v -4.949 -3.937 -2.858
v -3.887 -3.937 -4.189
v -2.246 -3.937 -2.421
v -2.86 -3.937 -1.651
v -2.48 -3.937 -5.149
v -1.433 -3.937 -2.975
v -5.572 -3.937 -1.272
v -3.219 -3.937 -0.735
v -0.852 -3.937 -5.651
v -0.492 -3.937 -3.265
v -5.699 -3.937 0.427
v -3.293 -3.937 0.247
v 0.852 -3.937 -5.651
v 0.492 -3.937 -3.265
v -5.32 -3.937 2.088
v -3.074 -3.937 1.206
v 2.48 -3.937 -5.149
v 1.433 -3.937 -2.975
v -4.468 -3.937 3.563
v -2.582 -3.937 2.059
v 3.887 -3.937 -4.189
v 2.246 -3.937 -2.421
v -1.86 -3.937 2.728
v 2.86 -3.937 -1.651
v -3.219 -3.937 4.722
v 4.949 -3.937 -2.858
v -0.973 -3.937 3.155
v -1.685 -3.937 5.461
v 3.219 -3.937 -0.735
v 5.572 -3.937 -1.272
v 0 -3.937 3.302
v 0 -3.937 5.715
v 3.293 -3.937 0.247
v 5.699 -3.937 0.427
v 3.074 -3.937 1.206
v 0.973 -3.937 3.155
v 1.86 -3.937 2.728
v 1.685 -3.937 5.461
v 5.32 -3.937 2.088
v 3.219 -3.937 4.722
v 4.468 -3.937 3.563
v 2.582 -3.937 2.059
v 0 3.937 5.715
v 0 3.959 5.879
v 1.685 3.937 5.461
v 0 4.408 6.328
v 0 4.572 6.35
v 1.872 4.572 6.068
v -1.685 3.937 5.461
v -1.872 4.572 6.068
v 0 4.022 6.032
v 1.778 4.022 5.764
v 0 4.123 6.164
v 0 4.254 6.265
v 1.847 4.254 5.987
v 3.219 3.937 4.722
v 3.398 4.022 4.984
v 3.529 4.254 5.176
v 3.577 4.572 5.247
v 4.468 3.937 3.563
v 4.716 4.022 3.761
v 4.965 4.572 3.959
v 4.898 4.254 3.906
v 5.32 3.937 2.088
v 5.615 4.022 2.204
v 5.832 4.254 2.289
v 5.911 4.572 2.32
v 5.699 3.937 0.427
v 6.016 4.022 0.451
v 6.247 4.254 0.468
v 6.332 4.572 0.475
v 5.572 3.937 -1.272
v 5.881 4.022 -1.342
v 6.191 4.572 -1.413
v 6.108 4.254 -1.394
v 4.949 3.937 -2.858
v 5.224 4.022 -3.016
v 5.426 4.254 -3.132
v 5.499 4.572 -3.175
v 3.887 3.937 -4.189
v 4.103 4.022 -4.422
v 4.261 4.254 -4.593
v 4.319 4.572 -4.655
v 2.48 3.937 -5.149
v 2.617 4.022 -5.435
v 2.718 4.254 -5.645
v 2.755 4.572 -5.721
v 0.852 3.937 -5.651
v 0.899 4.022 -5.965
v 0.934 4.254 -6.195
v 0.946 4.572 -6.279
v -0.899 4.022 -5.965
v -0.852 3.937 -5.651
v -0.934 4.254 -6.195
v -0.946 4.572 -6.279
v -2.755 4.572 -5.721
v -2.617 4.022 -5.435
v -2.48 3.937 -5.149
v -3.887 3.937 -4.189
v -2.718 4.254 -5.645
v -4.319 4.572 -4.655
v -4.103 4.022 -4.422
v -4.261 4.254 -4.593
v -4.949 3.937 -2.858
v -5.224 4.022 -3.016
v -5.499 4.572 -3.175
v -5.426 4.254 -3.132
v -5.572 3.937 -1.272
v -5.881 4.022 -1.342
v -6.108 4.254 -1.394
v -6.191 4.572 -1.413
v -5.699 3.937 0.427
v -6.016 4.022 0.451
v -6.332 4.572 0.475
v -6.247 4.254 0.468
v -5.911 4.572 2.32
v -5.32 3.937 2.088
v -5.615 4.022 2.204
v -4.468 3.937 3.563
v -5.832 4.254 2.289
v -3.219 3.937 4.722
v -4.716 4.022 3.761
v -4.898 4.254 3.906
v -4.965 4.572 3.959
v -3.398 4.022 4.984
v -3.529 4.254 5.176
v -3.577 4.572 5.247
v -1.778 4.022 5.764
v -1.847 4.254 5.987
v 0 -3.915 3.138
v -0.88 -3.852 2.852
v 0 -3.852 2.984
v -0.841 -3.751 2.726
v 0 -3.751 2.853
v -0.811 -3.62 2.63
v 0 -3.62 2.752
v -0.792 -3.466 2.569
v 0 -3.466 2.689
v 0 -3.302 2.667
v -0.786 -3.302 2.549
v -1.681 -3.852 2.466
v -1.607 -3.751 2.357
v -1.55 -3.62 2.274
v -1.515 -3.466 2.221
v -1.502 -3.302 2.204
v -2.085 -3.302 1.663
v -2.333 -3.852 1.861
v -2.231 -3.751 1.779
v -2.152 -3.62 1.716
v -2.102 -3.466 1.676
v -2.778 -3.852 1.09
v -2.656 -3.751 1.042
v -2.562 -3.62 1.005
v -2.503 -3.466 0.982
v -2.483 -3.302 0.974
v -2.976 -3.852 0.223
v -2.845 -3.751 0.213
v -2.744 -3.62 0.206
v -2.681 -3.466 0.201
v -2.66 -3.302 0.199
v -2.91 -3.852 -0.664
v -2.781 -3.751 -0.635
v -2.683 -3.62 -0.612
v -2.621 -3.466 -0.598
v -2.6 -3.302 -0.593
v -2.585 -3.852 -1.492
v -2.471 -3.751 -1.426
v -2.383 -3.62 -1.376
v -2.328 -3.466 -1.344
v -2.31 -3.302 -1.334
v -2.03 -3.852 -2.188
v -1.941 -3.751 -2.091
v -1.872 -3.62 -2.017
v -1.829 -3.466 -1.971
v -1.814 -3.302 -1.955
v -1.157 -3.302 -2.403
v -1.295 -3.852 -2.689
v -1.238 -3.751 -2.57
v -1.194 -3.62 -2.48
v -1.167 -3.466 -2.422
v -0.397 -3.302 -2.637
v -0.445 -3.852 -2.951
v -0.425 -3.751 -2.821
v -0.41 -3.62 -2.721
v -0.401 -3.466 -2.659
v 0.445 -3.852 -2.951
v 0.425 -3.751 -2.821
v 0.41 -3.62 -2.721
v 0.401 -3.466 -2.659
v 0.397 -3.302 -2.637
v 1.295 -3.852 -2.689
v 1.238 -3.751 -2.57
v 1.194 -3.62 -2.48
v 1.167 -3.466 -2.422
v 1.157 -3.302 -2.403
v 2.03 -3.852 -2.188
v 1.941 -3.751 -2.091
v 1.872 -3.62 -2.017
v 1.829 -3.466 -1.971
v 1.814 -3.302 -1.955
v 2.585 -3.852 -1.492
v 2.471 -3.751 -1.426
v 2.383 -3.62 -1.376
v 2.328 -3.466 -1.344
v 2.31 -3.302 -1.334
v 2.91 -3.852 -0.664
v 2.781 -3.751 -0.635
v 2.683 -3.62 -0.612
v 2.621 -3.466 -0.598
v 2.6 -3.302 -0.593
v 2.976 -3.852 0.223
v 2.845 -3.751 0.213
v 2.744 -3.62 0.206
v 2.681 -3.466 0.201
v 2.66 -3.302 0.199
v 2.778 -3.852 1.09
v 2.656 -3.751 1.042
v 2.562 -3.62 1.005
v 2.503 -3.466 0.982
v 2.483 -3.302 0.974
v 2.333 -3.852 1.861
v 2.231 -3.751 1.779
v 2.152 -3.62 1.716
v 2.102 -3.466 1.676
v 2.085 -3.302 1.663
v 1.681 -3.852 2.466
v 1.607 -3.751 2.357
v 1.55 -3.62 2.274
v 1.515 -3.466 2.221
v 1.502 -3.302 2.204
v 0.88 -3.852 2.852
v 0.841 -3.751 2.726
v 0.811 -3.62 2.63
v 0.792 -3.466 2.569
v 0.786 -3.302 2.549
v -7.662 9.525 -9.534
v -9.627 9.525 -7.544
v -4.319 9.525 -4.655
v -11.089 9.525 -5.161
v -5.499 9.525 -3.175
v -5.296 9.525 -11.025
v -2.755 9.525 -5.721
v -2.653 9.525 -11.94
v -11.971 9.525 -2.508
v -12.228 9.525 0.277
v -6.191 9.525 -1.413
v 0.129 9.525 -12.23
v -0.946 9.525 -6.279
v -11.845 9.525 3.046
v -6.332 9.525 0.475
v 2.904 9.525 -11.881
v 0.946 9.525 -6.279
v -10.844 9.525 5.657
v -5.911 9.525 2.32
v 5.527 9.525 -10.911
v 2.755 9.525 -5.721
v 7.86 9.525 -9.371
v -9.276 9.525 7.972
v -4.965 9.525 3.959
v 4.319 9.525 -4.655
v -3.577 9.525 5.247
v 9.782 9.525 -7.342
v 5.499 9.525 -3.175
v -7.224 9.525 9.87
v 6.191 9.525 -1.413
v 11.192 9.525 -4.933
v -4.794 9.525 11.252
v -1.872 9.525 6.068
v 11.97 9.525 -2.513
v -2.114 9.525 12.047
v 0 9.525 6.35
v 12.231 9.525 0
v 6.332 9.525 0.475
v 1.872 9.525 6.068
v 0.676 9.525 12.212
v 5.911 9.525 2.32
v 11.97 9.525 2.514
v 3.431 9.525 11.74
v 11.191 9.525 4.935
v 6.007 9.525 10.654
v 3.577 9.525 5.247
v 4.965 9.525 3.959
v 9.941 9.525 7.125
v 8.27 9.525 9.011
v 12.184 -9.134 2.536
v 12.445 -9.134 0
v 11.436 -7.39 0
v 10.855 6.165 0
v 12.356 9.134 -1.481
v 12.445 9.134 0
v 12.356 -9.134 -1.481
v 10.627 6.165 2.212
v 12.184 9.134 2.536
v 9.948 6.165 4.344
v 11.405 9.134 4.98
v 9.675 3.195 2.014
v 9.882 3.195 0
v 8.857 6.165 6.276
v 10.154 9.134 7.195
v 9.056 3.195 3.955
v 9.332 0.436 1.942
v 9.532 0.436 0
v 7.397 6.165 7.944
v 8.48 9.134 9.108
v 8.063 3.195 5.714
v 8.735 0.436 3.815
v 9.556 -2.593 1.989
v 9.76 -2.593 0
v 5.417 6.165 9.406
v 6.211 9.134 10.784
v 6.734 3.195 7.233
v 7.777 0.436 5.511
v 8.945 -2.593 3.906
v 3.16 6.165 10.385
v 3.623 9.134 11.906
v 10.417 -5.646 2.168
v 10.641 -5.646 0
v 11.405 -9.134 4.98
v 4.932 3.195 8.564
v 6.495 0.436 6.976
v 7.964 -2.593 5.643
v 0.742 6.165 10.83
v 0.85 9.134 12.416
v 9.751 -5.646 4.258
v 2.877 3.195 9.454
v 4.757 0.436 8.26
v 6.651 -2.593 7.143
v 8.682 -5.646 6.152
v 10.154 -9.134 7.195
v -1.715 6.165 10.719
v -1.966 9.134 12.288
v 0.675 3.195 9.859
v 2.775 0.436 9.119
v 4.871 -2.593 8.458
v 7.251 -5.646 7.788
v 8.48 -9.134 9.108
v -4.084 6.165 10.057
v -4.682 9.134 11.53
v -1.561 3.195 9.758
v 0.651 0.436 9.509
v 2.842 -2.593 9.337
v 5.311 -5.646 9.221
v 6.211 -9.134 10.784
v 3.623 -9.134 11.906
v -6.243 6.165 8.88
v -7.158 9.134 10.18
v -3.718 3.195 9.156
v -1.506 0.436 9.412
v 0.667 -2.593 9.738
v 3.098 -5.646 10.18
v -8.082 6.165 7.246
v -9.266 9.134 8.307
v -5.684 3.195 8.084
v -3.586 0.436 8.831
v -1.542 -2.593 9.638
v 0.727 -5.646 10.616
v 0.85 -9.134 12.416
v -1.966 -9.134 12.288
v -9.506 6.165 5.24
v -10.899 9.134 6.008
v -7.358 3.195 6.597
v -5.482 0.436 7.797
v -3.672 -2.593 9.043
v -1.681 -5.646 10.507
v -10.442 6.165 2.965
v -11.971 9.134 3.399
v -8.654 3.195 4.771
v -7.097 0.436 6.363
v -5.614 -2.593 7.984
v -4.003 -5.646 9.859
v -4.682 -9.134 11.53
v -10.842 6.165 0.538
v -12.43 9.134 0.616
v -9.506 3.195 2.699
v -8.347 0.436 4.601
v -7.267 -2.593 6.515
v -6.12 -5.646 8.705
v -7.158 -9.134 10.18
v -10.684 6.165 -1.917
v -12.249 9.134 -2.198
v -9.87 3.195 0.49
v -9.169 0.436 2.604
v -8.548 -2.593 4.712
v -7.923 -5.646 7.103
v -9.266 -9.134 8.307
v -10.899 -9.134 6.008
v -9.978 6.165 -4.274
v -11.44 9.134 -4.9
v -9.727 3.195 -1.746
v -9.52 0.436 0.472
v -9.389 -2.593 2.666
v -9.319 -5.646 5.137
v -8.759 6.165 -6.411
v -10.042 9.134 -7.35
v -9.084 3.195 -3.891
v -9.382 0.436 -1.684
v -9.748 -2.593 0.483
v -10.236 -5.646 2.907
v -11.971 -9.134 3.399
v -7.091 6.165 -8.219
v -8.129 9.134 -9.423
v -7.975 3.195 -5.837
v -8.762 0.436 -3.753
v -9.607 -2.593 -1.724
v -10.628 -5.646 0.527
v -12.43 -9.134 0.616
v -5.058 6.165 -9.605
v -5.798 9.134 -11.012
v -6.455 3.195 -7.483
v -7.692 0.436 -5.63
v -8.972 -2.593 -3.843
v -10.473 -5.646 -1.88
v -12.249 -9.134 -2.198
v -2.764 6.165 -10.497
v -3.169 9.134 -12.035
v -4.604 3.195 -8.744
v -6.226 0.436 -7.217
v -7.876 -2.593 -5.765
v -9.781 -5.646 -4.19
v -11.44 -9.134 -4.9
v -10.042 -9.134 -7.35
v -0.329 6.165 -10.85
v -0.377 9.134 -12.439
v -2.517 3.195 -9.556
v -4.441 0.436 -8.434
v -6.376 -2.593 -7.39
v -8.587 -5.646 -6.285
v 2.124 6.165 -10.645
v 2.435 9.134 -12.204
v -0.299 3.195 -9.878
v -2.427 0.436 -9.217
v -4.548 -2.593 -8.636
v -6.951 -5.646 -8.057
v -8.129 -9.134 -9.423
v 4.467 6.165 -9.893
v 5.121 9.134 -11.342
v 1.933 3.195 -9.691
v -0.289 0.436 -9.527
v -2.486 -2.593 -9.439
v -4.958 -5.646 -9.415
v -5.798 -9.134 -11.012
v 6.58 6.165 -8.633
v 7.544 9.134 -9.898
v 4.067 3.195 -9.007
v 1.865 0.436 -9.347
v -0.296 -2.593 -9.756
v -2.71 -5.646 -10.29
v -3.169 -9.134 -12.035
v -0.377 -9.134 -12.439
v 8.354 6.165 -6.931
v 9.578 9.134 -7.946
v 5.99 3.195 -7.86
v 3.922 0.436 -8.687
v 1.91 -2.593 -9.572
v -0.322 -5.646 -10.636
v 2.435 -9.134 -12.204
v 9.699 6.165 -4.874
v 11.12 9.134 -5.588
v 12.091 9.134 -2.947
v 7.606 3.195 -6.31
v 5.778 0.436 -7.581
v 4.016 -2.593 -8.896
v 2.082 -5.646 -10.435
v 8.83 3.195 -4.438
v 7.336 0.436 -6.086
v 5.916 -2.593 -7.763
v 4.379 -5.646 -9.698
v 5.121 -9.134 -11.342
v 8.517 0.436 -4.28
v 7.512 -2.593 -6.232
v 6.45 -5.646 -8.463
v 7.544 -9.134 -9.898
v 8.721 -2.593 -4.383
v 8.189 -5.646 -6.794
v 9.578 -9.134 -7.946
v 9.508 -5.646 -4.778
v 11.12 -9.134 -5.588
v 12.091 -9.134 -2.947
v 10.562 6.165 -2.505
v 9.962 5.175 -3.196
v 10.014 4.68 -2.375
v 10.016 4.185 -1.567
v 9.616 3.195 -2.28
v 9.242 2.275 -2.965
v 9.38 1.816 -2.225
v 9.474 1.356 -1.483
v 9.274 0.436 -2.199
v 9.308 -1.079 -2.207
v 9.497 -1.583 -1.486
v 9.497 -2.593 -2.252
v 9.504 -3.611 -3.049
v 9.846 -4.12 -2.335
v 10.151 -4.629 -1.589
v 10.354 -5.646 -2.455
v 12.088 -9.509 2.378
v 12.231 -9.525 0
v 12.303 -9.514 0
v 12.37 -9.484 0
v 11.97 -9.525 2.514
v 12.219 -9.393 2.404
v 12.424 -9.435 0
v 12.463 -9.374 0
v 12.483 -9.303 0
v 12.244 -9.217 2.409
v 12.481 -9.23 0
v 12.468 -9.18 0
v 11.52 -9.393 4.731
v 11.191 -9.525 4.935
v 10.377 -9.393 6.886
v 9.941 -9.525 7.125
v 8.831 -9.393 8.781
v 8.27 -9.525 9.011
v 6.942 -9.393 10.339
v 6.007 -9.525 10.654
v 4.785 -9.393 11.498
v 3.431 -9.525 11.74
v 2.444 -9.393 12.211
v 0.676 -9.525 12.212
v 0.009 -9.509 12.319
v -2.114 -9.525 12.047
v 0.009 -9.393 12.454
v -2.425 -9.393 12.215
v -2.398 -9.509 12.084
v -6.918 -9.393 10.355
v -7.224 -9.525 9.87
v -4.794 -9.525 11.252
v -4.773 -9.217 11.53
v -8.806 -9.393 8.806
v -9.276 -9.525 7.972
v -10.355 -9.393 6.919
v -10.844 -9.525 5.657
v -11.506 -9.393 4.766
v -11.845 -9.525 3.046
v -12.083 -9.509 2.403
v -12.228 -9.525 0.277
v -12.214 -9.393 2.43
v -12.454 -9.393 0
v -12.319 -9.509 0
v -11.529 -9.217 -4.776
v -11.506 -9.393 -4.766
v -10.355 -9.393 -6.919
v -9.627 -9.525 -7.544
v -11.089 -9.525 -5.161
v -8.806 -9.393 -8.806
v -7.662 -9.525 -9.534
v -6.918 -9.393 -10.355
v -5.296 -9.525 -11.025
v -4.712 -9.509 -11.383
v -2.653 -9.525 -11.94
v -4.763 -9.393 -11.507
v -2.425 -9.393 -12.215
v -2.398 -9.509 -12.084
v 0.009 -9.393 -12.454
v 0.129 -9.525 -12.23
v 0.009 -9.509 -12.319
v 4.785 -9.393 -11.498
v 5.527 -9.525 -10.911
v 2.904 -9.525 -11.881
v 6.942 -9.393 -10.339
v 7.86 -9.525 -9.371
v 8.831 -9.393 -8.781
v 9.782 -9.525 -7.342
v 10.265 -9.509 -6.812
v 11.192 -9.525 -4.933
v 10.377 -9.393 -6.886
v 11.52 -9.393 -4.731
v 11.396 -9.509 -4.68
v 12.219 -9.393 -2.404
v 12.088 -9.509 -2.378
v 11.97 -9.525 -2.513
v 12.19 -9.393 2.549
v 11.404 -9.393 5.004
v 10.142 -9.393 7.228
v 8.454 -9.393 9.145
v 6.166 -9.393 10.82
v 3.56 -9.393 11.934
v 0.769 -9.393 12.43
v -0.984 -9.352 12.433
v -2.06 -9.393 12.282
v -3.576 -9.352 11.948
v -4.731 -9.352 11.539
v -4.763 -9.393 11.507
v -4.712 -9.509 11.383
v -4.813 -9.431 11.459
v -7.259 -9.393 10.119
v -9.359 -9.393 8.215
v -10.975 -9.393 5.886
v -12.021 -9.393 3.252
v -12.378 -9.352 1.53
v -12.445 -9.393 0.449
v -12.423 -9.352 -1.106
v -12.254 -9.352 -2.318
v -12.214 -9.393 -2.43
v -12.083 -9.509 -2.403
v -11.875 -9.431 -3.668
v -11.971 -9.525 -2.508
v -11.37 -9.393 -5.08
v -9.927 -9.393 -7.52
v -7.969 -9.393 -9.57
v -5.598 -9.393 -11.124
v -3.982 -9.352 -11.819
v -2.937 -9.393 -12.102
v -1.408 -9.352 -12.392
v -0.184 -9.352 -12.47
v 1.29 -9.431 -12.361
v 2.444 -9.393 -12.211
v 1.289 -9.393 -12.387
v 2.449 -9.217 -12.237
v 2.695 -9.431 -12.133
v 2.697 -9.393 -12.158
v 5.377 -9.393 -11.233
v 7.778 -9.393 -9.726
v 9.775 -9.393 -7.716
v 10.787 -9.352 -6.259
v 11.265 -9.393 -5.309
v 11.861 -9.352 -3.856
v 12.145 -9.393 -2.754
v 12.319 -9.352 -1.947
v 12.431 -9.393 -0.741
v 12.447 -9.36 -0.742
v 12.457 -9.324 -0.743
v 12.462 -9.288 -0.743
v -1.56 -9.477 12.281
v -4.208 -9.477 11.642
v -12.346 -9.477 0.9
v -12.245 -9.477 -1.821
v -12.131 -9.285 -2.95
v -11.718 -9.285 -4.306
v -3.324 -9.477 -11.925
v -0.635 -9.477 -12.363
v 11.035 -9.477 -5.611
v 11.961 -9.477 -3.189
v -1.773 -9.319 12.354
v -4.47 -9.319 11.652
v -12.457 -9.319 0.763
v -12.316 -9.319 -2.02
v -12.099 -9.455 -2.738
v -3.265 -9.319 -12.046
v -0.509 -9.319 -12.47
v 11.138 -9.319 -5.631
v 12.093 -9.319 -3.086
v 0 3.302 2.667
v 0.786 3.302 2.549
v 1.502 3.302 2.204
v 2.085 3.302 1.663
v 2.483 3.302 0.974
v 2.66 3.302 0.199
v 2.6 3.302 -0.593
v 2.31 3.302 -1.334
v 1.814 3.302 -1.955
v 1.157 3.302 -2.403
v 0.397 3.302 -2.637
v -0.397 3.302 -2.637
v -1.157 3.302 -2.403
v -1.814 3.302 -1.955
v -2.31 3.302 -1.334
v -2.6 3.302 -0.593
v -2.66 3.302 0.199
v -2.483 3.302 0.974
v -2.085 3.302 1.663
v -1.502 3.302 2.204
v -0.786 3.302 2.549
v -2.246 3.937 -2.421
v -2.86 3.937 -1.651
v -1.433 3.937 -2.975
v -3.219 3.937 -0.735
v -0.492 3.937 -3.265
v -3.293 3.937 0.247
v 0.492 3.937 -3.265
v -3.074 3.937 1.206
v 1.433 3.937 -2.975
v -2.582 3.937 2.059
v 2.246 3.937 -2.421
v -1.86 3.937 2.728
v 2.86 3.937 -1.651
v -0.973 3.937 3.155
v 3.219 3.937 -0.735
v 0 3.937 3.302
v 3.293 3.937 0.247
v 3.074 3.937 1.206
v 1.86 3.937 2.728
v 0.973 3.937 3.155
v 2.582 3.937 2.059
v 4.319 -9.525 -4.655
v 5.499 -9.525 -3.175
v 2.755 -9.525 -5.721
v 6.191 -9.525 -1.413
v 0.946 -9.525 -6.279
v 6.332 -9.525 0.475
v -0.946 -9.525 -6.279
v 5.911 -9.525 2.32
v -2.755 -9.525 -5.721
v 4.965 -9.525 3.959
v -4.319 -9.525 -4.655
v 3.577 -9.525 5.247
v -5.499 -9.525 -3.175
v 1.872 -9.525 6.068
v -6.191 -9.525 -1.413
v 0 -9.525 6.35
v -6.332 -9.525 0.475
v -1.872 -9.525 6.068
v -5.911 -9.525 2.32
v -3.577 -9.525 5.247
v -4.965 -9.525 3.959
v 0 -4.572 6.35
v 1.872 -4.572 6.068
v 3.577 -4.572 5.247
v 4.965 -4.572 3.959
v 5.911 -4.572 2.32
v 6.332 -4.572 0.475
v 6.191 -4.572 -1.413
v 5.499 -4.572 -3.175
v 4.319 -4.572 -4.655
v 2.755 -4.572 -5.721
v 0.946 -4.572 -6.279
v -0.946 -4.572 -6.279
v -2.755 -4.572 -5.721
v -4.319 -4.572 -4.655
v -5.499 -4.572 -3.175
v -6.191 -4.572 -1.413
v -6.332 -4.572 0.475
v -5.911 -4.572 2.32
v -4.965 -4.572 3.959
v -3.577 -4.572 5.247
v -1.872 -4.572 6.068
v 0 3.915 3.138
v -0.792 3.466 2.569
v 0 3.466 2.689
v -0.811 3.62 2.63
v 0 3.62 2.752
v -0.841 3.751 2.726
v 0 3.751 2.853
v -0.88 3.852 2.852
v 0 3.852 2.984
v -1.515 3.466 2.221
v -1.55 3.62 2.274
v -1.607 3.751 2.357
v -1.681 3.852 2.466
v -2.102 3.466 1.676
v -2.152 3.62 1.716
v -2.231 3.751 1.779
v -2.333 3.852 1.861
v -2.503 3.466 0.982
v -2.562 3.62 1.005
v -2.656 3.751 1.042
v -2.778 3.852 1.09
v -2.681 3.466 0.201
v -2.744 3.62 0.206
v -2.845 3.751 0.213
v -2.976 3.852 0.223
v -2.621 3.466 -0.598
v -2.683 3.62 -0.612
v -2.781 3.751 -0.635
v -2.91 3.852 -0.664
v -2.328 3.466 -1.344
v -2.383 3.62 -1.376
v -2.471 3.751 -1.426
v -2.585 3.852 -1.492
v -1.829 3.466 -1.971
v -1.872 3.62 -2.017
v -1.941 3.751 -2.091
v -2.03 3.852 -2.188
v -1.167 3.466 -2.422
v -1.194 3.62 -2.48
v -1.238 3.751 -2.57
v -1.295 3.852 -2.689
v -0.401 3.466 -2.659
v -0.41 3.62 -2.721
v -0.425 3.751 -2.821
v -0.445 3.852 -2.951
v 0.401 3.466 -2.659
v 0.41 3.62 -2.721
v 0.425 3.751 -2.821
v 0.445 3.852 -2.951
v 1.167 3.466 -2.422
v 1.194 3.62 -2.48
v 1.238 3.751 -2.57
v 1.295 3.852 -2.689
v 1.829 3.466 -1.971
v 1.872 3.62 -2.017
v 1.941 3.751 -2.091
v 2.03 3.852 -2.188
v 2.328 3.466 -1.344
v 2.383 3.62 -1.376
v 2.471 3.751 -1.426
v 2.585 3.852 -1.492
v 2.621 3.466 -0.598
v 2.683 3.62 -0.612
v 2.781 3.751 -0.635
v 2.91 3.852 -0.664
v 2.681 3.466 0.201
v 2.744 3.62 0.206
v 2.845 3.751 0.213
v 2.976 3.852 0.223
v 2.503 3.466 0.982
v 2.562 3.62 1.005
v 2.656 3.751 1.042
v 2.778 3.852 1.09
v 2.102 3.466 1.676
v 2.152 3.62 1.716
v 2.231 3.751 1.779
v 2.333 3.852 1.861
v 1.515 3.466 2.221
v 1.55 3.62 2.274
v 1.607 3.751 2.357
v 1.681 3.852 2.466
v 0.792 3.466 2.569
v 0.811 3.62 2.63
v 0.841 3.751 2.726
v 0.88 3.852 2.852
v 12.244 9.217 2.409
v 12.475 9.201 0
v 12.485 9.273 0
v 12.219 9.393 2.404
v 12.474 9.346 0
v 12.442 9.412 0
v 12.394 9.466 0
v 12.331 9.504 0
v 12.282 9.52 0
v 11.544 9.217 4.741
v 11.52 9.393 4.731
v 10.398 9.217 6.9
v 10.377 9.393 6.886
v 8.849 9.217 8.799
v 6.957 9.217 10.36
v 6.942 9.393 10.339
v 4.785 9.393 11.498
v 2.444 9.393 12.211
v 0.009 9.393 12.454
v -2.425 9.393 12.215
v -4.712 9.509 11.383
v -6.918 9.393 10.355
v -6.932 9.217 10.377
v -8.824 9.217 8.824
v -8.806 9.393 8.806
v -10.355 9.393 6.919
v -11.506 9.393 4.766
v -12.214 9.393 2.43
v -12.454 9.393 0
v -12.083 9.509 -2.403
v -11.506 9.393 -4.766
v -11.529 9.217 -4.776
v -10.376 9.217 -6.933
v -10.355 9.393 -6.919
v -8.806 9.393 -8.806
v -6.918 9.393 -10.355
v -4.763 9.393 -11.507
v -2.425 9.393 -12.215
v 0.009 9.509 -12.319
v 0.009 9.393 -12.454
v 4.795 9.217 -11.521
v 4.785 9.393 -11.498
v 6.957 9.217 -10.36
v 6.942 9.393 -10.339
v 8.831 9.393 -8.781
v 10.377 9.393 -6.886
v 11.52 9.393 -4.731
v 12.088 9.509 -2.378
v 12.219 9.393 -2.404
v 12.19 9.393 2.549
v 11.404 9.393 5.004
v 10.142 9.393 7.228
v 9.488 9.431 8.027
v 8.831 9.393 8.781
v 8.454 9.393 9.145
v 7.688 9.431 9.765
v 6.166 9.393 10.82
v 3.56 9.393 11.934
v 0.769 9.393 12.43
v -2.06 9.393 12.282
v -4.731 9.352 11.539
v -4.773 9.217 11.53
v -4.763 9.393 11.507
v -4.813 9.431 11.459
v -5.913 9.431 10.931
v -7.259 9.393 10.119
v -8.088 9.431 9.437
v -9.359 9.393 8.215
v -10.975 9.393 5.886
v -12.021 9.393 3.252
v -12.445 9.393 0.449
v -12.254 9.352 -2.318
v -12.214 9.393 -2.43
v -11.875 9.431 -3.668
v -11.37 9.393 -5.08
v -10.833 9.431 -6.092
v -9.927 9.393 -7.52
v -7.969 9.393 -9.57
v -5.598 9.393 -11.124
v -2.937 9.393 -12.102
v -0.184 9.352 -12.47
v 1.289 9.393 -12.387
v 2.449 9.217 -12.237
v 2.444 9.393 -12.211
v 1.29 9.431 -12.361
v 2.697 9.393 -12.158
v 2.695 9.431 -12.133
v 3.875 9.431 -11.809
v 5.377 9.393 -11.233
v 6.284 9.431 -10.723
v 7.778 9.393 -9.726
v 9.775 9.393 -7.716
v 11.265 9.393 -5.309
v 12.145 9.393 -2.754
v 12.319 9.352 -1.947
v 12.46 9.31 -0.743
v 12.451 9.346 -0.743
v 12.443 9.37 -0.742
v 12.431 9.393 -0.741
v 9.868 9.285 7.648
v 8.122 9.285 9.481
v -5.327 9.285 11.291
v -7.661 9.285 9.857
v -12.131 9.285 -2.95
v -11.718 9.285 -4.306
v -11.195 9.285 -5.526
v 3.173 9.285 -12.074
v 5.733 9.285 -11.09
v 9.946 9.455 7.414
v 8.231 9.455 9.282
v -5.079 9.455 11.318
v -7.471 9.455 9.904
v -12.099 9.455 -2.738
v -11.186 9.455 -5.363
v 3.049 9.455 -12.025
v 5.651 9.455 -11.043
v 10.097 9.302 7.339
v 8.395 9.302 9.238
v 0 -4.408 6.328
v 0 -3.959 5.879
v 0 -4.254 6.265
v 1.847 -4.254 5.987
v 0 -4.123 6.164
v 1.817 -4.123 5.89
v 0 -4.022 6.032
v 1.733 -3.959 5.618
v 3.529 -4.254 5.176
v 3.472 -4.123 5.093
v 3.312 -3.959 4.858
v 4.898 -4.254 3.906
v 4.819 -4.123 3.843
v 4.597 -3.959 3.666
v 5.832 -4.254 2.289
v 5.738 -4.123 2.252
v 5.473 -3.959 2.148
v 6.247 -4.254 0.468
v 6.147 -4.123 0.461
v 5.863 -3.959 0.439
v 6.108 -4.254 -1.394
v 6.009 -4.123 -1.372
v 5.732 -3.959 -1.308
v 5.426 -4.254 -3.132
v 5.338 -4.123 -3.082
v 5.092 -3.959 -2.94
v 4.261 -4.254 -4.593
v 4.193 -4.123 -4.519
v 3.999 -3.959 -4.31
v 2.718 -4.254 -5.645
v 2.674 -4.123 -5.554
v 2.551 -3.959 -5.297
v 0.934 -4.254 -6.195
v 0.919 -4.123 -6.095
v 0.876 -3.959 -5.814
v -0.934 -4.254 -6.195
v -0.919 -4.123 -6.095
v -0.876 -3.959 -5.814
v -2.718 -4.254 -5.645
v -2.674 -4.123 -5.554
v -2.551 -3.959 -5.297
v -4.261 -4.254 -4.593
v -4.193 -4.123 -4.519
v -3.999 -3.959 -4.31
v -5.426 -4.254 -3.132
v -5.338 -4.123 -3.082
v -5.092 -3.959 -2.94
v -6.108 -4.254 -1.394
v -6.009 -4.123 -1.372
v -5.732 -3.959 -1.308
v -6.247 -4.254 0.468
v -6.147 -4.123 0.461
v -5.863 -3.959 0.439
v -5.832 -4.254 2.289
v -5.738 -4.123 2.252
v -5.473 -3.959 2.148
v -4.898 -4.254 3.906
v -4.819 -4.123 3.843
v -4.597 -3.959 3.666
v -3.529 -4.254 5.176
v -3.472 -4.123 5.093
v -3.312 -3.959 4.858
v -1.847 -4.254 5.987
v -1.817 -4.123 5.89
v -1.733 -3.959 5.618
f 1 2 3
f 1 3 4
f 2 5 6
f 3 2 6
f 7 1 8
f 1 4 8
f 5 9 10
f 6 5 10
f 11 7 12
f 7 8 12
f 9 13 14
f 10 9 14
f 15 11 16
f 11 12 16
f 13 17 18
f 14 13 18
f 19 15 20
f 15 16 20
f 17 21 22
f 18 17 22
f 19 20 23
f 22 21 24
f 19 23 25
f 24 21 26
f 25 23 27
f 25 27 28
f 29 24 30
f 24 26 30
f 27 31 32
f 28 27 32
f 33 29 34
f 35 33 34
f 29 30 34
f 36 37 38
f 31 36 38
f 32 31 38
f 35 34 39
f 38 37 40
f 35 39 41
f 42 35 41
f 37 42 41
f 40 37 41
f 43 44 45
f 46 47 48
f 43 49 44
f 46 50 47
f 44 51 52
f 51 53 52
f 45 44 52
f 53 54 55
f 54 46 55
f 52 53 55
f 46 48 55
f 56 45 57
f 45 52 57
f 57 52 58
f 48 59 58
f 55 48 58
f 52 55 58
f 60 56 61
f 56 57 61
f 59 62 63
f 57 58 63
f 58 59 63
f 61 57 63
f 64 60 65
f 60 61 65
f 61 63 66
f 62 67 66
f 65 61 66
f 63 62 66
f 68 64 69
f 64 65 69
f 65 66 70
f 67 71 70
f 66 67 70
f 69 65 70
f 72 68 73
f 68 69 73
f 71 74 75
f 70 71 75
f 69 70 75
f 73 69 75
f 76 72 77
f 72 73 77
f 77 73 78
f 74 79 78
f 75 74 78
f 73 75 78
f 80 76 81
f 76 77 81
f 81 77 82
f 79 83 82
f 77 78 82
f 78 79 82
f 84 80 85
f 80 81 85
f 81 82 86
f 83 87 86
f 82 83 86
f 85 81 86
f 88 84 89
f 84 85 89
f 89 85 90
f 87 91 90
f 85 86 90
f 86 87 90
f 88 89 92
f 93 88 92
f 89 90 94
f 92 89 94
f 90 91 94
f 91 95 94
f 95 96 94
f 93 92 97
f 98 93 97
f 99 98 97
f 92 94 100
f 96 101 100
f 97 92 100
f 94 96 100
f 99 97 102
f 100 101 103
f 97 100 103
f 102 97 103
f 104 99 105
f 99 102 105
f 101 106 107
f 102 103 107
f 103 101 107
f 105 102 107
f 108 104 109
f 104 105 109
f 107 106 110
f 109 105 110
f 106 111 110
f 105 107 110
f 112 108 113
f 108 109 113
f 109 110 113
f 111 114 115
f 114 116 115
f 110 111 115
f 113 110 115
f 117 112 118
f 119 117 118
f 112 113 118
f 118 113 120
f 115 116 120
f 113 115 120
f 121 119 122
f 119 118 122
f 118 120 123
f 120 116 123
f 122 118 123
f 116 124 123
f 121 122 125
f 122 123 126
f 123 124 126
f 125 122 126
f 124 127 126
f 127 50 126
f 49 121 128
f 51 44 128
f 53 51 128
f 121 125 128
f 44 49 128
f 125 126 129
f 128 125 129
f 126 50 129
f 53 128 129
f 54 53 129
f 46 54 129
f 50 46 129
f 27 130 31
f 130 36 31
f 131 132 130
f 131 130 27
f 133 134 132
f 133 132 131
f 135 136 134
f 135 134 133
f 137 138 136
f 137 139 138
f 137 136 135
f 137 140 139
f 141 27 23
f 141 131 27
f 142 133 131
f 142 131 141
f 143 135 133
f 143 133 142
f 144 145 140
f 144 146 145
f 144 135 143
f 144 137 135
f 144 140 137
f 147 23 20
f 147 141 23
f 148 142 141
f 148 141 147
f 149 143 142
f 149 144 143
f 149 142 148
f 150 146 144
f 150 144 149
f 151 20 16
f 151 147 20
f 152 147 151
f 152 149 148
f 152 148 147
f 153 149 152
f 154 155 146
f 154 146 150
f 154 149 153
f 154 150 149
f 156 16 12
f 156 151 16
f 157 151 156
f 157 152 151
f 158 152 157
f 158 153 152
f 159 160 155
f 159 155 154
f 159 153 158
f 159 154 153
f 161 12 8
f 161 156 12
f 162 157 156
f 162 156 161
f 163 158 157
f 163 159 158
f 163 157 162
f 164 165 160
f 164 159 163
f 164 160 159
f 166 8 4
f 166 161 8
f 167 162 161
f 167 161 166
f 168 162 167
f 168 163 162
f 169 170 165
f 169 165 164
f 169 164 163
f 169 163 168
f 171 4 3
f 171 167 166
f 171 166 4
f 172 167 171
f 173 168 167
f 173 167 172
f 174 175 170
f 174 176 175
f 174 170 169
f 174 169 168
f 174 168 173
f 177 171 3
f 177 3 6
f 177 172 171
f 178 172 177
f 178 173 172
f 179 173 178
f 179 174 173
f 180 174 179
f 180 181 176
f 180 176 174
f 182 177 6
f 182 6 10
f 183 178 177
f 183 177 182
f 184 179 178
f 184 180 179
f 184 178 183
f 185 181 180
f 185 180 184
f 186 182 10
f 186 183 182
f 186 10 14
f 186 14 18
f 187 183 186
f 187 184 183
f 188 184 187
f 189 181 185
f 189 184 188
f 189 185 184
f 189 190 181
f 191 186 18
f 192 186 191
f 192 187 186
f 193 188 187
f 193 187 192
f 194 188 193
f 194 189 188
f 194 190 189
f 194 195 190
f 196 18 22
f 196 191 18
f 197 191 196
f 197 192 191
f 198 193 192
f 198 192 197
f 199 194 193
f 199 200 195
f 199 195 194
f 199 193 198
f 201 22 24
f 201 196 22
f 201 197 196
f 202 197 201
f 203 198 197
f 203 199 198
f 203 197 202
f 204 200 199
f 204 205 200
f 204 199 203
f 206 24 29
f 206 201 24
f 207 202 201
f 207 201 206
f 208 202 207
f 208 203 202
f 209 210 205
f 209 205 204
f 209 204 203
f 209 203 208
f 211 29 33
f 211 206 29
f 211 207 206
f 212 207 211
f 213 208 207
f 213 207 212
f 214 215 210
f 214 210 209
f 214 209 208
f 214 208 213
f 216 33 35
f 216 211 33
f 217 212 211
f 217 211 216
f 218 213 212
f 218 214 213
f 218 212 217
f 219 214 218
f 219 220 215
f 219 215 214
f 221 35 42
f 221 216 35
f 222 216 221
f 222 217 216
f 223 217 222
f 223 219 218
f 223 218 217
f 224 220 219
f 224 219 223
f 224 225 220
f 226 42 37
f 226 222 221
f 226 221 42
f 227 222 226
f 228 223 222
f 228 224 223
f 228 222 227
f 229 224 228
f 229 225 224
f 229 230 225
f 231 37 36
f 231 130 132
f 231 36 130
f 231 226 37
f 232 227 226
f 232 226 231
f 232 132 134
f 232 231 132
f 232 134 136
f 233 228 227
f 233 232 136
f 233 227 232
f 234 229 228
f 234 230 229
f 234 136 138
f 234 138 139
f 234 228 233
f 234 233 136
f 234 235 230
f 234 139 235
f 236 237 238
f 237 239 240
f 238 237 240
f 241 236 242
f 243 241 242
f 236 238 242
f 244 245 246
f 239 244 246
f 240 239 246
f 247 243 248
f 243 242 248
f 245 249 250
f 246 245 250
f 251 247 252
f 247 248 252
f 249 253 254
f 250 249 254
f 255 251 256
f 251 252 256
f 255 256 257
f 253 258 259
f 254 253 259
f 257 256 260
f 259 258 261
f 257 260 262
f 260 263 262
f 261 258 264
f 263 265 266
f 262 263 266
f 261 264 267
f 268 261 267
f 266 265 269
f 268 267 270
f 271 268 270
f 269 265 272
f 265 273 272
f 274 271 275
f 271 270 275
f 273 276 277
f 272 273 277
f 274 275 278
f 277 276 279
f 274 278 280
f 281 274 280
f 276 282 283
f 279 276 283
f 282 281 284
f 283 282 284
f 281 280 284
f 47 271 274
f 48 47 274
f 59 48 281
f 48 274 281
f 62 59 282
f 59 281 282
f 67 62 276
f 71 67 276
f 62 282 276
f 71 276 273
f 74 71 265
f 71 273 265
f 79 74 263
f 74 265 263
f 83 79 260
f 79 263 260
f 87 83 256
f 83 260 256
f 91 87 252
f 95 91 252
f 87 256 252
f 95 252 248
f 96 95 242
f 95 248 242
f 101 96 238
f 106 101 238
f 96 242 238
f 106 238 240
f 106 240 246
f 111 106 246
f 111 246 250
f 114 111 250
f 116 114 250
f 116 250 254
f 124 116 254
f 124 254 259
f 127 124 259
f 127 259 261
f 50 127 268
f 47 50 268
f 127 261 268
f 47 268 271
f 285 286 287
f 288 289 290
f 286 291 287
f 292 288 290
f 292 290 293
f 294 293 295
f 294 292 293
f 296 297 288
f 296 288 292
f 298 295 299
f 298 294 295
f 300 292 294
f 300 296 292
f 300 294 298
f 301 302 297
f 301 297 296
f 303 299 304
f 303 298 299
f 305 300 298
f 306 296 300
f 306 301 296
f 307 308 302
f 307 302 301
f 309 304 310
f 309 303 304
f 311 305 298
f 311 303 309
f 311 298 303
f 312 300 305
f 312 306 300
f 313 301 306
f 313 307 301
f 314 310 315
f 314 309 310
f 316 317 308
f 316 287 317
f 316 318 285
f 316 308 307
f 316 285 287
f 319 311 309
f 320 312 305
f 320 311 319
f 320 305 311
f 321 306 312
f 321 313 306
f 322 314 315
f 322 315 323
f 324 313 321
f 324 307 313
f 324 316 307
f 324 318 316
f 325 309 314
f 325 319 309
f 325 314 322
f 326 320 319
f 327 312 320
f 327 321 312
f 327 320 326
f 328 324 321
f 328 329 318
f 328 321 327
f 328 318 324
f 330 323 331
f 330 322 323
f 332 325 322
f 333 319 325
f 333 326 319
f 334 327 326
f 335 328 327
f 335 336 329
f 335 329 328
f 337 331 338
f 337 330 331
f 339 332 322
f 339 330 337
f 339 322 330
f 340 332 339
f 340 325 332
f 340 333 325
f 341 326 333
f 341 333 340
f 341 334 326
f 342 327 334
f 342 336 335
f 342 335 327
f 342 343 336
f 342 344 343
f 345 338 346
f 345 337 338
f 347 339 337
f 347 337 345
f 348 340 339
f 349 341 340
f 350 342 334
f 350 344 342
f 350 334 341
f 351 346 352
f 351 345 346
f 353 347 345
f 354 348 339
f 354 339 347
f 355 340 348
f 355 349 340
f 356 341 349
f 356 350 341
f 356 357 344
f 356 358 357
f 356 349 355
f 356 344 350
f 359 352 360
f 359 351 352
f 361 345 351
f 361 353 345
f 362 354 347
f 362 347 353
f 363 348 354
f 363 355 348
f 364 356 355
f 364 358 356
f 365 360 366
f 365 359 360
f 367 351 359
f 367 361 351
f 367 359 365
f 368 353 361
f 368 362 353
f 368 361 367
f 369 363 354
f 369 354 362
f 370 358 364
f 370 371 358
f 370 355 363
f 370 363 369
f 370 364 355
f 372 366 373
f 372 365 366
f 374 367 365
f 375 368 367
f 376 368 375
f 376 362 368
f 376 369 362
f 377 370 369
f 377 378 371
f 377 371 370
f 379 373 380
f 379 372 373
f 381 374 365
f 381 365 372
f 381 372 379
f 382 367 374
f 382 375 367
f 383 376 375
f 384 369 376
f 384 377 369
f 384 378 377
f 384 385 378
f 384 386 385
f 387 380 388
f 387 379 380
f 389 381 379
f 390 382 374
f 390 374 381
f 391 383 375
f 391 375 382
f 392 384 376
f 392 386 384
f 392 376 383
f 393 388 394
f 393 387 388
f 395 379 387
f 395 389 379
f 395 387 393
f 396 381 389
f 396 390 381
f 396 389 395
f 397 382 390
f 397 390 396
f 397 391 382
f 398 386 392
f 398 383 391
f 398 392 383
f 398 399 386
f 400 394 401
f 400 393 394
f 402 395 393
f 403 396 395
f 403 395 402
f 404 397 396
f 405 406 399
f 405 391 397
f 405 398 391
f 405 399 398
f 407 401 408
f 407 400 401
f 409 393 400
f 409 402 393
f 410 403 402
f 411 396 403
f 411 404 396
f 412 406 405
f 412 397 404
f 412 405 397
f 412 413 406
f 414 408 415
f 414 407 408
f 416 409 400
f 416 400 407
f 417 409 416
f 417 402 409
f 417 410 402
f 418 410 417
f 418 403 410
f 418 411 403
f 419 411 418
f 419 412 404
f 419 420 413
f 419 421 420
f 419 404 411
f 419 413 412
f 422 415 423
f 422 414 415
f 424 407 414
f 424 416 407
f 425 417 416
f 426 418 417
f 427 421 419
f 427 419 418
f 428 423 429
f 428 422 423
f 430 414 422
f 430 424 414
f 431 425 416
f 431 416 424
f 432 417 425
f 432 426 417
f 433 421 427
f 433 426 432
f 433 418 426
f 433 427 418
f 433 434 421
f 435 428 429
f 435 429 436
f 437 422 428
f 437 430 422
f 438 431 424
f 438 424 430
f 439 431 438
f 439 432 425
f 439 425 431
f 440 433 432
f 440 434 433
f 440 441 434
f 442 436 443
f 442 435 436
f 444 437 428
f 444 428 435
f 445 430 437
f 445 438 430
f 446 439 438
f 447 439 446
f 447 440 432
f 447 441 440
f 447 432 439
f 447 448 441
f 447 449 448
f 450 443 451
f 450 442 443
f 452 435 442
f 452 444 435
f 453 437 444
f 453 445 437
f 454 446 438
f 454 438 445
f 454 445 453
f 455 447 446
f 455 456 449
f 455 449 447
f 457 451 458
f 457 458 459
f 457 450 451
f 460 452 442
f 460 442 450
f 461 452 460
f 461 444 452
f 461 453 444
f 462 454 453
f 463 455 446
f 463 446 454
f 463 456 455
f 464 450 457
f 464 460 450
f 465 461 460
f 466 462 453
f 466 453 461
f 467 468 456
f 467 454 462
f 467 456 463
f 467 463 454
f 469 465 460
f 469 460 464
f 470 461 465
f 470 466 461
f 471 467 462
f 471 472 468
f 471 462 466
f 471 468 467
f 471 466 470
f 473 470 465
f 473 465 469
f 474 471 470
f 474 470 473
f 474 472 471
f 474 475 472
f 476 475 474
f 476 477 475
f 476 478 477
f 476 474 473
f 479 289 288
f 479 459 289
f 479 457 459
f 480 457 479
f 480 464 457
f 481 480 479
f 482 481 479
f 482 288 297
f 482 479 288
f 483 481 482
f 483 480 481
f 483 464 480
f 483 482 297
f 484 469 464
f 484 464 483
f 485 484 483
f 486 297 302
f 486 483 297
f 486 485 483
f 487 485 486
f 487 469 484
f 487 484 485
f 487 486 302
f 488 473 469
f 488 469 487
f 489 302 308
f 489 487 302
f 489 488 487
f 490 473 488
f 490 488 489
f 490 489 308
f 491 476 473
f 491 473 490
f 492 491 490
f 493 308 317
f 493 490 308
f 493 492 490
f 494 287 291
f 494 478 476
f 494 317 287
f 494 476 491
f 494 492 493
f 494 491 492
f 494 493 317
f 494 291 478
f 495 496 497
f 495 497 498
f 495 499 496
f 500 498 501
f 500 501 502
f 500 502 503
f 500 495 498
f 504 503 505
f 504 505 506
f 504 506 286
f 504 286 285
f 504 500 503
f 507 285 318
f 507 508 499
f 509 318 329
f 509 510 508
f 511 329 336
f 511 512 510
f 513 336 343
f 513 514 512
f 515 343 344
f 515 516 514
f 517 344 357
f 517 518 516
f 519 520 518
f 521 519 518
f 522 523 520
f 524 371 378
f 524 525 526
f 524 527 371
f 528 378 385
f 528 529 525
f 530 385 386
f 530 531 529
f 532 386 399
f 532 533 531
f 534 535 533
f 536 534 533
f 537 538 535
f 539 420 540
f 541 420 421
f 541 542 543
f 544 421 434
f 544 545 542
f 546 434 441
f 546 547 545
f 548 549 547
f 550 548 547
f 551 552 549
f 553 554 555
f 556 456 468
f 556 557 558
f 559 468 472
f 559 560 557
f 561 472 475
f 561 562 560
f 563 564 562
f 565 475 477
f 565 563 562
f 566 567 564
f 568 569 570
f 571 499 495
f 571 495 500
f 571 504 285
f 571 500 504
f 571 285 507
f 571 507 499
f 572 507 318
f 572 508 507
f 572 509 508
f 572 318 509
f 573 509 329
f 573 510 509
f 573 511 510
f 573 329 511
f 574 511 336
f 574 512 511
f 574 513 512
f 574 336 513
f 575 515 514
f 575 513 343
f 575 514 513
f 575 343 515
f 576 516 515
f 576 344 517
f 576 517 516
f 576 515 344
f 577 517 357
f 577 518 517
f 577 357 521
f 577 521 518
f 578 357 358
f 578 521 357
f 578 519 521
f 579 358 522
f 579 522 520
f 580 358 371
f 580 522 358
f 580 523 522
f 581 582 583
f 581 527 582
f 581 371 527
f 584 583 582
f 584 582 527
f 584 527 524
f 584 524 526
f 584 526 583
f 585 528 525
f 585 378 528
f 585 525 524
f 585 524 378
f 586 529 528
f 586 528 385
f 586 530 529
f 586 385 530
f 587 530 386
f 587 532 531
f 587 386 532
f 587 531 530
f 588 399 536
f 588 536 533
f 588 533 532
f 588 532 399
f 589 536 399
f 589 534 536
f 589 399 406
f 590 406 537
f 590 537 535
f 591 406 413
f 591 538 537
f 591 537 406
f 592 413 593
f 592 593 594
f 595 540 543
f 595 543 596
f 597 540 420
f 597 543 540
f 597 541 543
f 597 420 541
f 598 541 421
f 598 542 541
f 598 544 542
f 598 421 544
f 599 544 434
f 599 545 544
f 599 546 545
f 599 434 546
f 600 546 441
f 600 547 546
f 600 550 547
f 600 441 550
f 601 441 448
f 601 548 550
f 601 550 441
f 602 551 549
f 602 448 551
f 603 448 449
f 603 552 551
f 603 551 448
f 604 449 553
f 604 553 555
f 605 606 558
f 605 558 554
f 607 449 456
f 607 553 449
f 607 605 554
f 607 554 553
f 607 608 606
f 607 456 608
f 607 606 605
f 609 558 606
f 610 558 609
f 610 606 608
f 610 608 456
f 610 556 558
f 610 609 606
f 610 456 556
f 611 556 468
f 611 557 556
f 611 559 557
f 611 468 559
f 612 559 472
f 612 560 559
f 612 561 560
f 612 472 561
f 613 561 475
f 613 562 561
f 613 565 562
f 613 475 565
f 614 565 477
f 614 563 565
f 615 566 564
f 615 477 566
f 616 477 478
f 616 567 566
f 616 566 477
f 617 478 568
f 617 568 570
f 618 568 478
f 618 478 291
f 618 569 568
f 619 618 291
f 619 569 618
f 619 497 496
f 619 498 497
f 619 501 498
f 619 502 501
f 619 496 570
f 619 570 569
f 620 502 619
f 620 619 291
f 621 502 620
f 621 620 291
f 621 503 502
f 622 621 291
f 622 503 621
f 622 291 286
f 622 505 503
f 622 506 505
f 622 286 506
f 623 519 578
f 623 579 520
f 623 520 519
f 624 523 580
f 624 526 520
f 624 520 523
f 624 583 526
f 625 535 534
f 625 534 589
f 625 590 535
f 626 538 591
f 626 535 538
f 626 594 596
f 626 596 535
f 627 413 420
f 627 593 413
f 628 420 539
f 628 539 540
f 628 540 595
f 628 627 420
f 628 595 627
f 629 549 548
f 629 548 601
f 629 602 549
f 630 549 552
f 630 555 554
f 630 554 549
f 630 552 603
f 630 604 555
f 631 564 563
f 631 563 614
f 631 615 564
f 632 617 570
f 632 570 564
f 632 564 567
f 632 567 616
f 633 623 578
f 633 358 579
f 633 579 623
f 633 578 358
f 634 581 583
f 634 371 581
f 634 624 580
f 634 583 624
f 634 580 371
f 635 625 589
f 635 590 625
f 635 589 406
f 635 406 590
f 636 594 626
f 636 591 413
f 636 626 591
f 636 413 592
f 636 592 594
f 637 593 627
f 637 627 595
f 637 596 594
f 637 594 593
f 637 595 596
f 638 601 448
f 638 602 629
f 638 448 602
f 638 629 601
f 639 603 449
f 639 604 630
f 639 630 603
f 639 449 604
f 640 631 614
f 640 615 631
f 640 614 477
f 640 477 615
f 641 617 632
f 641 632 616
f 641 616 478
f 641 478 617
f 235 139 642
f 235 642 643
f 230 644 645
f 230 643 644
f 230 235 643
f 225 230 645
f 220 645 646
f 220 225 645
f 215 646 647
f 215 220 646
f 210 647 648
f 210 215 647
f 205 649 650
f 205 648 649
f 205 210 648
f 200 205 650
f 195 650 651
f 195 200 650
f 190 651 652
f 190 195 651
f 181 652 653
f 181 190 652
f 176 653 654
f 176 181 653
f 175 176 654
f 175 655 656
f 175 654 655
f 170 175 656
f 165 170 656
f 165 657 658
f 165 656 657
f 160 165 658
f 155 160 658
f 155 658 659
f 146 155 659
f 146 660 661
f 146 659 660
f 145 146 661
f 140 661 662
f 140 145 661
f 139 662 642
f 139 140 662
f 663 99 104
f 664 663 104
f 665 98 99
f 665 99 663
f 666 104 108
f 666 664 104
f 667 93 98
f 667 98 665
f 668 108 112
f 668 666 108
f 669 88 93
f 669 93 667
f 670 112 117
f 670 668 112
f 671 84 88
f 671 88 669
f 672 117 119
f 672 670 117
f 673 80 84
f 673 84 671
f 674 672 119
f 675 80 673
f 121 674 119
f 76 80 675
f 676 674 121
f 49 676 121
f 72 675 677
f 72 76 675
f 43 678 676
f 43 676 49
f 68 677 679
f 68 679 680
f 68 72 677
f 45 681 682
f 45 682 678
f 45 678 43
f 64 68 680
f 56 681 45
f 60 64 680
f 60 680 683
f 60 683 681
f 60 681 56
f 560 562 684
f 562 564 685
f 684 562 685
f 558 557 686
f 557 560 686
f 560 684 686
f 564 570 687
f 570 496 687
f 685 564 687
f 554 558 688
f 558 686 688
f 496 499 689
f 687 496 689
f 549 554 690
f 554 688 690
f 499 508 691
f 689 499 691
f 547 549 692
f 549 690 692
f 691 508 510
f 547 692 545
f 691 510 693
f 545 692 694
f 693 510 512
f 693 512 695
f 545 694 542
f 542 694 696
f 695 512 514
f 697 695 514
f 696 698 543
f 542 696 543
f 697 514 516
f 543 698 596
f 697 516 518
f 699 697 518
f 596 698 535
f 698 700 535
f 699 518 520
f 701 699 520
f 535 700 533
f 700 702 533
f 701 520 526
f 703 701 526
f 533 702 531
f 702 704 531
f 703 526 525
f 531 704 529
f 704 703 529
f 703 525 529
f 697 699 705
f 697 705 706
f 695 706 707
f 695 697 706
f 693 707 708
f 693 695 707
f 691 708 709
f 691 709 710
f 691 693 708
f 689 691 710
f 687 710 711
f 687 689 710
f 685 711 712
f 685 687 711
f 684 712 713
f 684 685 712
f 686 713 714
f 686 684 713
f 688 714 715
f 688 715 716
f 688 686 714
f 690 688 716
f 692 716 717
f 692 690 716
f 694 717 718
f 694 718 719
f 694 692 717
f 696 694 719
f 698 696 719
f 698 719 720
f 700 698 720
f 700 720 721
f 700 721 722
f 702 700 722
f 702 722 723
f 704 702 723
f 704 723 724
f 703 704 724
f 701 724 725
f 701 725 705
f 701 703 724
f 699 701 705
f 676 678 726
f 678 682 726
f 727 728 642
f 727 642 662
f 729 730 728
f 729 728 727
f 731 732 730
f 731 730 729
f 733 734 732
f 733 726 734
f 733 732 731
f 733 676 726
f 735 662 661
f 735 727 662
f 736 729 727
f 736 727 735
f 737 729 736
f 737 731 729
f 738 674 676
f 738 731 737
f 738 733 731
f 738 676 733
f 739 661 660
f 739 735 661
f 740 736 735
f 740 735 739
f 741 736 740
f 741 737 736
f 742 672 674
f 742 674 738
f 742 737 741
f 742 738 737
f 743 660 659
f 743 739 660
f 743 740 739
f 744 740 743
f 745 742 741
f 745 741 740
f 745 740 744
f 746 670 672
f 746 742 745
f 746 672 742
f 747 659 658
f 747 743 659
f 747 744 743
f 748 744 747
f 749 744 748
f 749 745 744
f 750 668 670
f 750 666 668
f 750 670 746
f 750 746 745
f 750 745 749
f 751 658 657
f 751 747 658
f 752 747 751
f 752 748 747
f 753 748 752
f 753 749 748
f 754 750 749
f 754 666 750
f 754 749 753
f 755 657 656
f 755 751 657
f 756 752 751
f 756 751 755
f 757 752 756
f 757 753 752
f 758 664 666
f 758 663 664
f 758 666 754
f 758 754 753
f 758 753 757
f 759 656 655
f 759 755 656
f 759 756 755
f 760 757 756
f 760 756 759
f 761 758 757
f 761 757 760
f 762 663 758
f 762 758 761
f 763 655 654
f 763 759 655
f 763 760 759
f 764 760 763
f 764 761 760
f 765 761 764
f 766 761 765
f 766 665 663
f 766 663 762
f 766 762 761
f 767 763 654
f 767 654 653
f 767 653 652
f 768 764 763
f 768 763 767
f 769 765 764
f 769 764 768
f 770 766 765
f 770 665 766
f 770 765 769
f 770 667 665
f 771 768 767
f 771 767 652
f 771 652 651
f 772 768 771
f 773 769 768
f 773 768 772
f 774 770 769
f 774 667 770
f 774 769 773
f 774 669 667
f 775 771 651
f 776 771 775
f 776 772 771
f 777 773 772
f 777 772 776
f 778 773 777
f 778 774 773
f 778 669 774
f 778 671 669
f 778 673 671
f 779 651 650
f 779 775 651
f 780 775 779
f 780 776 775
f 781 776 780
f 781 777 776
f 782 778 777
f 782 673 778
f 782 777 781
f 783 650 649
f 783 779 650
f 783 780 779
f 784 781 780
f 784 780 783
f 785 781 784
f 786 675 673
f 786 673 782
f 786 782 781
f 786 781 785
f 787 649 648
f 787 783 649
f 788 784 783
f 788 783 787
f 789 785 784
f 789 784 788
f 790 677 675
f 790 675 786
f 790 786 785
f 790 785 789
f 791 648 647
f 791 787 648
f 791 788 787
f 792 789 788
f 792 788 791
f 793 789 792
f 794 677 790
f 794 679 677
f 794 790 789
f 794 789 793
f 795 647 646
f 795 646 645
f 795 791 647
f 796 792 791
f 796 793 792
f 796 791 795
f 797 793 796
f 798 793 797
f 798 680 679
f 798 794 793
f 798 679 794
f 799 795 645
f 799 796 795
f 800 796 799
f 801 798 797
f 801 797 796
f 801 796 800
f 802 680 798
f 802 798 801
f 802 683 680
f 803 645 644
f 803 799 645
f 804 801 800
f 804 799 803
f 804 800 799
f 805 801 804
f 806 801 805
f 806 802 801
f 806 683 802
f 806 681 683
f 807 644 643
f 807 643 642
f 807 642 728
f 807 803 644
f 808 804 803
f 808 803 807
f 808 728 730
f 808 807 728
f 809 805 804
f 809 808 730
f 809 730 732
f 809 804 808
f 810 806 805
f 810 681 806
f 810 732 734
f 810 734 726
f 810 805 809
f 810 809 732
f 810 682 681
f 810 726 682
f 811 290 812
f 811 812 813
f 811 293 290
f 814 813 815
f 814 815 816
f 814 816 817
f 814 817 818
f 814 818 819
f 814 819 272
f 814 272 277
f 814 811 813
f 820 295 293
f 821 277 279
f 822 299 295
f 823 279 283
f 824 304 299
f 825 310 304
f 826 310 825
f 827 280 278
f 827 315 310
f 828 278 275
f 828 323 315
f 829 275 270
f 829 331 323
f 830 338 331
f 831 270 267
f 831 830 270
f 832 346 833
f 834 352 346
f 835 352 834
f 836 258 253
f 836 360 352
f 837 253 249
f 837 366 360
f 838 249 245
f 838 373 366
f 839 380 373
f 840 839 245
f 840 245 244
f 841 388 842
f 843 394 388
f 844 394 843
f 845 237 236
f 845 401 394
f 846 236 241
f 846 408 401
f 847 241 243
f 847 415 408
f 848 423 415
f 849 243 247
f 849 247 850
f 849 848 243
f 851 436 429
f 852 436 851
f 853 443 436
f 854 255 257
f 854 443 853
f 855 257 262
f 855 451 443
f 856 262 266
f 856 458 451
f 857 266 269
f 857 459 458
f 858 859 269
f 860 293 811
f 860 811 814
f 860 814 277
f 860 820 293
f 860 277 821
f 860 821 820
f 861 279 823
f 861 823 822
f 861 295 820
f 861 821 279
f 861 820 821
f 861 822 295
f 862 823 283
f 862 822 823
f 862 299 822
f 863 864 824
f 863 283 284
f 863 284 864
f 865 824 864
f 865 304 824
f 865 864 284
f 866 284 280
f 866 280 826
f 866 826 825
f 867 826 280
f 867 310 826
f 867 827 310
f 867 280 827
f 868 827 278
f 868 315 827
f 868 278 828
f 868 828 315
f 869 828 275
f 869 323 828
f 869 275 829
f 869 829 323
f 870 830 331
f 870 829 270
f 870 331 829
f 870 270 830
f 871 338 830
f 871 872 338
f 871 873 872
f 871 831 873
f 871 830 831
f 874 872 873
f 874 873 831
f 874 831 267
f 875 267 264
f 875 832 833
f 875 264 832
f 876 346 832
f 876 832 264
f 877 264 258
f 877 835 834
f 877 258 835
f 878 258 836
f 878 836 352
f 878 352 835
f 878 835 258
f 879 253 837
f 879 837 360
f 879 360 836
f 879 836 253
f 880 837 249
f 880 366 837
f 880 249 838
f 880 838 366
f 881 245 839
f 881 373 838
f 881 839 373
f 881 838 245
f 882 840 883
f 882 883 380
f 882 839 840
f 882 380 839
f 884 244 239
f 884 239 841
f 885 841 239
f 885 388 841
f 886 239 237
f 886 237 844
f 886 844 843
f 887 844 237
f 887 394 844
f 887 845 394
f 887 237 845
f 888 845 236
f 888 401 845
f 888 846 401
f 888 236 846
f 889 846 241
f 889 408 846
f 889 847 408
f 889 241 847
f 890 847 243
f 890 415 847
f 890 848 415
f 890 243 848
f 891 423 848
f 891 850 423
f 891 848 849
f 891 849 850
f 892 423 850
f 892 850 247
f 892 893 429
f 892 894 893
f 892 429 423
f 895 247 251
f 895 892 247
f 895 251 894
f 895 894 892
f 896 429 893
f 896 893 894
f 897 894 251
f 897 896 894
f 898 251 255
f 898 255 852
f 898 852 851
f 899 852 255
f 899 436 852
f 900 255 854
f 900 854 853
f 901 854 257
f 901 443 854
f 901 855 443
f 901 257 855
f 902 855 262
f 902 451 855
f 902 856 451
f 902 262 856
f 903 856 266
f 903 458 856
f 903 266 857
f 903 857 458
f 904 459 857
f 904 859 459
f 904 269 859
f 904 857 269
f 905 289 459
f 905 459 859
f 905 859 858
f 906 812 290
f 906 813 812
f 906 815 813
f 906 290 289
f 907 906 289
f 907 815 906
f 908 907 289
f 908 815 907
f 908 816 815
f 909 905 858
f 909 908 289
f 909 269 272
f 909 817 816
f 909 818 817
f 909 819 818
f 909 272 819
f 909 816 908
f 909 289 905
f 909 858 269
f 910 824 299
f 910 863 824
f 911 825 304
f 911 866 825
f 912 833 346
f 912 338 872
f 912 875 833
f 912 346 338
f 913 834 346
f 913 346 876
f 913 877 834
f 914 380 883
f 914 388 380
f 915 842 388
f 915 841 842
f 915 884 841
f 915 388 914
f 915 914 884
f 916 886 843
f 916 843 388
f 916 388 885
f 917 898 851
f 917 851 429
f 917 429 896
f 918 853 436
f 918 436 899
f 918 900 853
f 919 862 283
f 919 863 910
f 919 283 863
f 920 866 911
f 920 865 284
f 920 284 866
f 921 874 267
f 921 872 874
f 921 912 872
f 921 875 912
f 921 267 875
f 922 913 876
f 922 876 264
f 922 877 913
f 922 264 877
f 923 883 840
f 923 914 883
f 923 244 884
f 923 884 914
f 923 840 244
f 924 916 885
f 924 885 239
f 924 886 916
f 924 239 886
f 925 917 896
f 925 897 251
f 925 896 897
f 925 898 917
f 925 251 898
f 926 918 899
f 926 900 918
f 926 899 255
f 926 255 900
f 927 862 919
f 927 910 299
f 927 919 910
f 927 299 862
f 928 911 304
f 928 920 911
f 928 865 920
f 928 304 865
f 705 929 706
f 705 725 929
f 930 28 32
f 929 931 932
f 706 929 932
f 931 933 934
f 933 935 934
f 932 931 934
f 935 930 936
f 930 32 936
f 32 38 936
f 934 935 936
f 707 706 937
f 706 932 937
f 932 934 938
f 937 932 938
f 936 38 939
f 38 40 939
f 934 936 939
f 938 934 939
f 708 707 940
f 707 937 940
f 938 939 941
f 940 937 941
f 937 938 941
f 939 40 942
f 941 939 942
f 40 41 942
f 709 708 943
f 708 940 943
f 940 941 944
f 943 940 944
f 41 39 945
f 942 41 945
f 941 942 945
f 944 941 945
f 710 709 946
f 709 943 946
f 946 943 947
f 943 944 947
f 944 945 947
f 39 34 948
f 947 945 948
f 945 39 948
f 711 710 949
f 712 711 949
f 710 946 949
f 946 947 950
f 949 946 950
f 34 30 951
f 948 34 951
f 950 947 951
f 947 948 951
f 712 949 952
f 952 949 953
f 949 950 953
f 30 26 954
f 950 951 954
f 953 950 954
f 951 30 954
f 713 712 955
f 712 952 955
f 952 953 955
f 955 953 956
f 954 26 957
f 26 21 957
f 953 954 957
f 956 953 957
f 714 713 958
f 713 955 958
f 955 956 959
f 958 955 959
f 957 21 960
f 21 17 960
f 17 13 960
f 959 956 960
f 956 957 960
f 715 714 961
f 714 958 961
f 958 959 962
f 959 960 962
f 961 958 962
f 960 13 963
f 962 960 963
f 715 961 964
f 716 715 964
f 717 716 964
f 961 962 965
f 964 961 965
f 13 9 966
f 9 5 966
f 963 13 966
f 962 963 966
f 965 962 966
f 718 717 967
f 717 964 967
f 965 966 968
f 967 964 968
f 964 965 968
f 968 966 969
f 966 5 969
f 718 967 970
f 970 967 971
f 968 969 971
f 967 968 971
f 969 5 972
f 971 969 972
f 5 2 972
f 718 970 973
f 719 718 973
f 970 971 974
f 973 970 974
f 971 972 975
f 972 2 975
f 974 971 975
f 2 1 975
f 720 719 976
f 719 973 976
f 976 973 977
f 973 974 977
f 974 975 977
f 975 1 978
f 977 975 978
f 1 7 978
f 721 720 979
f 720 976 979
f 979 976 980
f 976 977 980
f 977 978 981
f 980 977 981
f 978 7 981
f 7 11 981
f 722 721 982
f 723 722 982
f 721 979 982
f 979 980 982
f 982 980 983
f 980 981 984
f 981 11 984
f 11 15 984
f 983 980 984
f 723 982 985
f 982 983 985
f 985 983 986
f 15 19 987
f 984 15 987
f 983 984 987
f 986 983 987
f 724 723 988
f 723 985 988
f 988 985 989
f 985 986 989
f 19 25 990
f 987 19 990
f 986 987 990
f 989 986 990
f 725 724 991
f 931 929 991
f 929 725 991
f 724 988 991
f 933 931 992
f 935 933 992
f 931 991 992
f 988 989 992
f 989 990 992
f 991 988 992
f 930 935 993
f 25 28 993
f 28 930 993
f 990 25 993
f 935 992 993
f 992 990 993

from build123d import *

# Parameters (mm, degrees)
CUT_EXTRUDE1_DEPTH      = 27.181720892
CUT_EXTRUDE1_DEPTH_BACK = 27.181720892
SKETCH2_R               = 2.667
SKETCH3_R               = 6.35
CUT_EXTRUDE2_DEPTH      = 5.588
FILLET1_R               = 0.254
FILLET2_R               = 0.635
FILLET3_R               = 0.635


with BuildPart() as part:
    # Sketch1 → Revolve2 (revolve)
    with BuildSketch(Plane.XY):
        with BuildLine():
            Line((0, 9.525), (0, -9.525))
            Line((0, -9.525), (12.7, -9.525))
            add(Edge.make_bspline(
                [(12.7, 9.525), (6.35, 0), (12.7, -9.525)],
                knots=[0, 0, 0, 1, 1, 1], degree=2))
            Line((12.7, 9.525), (0, 9.525))
        make_face()
    revolve(axis=Axis((0, 9.525, 0), (0, -1, 0)))

    # Sketch2 → Cut-Extrude1 (cut, two sides: drawn at the far end of the back side and taken through both)
    with BuildSketch(Plane(origin=(0, 9.525, 0), x_dir=(1, 0, 0), z_dir=(0, 1, 0)).offset(-CUT_EXTRUDE1_DEPTH_BACK)):
        with Locations(Location((0, 0, 0), (0, 0, 270))):
            Circle(SKETCH2_R)
    extrude(amount=CUT_EXTRUDE1_DEPTH + CUT_EXTRUDE1_DEPTH_BACK, mode=Mode.SUBTRACT)

    # Sketch3 → Cut-Extrude2 (cut)
    with BuildSketch(Plane(origin=(0, 9.525, 0), x_dir=(1, 0, 0), z_dir=(0, 1, 0))):
        with Locations(Location((0, 0, 0), (0, 0, 270))):
            Circle(SKETCH3_R)
    cut_extrude2 = extrude(amount=-CUT_EXTRUDE2_DEPTH, mode=Mode.SUBTRACT)

    # Mirror1: Cut-Extrude2 across plane
    add(cut_extrude2.mirror(Plane.ZX), mode=Mode.SUBTRACT)

    # Fillet1
    fillet1_edges = [part.edges().sort_by_distance(p)[0] for p in [
        (-12.7, -9.525, 0),
        (-12.7, 9.525, 0),
    ]]
    fillet(fillet1_edges, radius=FILLET1_R)

    # Fillet2
    fillet2_edges = [part.edges().sort_by_distance(p)[0] for p in [
        (0, 3.937, -6.35),
        (0, -3.937, -6.35),
    ]]
    fillet(fillet2_edges, radius=FILLET2_R)

    # Fillet3
    fillet3_edges = [part.edges().sort_by_distance(p)[0] for p in [
        (0, 3.937, -2.667),
        (0, -3.937, -2.667),
    ]]
    fillet(fillet3_edges, radius=FILLET3_R)


solid = part.part
